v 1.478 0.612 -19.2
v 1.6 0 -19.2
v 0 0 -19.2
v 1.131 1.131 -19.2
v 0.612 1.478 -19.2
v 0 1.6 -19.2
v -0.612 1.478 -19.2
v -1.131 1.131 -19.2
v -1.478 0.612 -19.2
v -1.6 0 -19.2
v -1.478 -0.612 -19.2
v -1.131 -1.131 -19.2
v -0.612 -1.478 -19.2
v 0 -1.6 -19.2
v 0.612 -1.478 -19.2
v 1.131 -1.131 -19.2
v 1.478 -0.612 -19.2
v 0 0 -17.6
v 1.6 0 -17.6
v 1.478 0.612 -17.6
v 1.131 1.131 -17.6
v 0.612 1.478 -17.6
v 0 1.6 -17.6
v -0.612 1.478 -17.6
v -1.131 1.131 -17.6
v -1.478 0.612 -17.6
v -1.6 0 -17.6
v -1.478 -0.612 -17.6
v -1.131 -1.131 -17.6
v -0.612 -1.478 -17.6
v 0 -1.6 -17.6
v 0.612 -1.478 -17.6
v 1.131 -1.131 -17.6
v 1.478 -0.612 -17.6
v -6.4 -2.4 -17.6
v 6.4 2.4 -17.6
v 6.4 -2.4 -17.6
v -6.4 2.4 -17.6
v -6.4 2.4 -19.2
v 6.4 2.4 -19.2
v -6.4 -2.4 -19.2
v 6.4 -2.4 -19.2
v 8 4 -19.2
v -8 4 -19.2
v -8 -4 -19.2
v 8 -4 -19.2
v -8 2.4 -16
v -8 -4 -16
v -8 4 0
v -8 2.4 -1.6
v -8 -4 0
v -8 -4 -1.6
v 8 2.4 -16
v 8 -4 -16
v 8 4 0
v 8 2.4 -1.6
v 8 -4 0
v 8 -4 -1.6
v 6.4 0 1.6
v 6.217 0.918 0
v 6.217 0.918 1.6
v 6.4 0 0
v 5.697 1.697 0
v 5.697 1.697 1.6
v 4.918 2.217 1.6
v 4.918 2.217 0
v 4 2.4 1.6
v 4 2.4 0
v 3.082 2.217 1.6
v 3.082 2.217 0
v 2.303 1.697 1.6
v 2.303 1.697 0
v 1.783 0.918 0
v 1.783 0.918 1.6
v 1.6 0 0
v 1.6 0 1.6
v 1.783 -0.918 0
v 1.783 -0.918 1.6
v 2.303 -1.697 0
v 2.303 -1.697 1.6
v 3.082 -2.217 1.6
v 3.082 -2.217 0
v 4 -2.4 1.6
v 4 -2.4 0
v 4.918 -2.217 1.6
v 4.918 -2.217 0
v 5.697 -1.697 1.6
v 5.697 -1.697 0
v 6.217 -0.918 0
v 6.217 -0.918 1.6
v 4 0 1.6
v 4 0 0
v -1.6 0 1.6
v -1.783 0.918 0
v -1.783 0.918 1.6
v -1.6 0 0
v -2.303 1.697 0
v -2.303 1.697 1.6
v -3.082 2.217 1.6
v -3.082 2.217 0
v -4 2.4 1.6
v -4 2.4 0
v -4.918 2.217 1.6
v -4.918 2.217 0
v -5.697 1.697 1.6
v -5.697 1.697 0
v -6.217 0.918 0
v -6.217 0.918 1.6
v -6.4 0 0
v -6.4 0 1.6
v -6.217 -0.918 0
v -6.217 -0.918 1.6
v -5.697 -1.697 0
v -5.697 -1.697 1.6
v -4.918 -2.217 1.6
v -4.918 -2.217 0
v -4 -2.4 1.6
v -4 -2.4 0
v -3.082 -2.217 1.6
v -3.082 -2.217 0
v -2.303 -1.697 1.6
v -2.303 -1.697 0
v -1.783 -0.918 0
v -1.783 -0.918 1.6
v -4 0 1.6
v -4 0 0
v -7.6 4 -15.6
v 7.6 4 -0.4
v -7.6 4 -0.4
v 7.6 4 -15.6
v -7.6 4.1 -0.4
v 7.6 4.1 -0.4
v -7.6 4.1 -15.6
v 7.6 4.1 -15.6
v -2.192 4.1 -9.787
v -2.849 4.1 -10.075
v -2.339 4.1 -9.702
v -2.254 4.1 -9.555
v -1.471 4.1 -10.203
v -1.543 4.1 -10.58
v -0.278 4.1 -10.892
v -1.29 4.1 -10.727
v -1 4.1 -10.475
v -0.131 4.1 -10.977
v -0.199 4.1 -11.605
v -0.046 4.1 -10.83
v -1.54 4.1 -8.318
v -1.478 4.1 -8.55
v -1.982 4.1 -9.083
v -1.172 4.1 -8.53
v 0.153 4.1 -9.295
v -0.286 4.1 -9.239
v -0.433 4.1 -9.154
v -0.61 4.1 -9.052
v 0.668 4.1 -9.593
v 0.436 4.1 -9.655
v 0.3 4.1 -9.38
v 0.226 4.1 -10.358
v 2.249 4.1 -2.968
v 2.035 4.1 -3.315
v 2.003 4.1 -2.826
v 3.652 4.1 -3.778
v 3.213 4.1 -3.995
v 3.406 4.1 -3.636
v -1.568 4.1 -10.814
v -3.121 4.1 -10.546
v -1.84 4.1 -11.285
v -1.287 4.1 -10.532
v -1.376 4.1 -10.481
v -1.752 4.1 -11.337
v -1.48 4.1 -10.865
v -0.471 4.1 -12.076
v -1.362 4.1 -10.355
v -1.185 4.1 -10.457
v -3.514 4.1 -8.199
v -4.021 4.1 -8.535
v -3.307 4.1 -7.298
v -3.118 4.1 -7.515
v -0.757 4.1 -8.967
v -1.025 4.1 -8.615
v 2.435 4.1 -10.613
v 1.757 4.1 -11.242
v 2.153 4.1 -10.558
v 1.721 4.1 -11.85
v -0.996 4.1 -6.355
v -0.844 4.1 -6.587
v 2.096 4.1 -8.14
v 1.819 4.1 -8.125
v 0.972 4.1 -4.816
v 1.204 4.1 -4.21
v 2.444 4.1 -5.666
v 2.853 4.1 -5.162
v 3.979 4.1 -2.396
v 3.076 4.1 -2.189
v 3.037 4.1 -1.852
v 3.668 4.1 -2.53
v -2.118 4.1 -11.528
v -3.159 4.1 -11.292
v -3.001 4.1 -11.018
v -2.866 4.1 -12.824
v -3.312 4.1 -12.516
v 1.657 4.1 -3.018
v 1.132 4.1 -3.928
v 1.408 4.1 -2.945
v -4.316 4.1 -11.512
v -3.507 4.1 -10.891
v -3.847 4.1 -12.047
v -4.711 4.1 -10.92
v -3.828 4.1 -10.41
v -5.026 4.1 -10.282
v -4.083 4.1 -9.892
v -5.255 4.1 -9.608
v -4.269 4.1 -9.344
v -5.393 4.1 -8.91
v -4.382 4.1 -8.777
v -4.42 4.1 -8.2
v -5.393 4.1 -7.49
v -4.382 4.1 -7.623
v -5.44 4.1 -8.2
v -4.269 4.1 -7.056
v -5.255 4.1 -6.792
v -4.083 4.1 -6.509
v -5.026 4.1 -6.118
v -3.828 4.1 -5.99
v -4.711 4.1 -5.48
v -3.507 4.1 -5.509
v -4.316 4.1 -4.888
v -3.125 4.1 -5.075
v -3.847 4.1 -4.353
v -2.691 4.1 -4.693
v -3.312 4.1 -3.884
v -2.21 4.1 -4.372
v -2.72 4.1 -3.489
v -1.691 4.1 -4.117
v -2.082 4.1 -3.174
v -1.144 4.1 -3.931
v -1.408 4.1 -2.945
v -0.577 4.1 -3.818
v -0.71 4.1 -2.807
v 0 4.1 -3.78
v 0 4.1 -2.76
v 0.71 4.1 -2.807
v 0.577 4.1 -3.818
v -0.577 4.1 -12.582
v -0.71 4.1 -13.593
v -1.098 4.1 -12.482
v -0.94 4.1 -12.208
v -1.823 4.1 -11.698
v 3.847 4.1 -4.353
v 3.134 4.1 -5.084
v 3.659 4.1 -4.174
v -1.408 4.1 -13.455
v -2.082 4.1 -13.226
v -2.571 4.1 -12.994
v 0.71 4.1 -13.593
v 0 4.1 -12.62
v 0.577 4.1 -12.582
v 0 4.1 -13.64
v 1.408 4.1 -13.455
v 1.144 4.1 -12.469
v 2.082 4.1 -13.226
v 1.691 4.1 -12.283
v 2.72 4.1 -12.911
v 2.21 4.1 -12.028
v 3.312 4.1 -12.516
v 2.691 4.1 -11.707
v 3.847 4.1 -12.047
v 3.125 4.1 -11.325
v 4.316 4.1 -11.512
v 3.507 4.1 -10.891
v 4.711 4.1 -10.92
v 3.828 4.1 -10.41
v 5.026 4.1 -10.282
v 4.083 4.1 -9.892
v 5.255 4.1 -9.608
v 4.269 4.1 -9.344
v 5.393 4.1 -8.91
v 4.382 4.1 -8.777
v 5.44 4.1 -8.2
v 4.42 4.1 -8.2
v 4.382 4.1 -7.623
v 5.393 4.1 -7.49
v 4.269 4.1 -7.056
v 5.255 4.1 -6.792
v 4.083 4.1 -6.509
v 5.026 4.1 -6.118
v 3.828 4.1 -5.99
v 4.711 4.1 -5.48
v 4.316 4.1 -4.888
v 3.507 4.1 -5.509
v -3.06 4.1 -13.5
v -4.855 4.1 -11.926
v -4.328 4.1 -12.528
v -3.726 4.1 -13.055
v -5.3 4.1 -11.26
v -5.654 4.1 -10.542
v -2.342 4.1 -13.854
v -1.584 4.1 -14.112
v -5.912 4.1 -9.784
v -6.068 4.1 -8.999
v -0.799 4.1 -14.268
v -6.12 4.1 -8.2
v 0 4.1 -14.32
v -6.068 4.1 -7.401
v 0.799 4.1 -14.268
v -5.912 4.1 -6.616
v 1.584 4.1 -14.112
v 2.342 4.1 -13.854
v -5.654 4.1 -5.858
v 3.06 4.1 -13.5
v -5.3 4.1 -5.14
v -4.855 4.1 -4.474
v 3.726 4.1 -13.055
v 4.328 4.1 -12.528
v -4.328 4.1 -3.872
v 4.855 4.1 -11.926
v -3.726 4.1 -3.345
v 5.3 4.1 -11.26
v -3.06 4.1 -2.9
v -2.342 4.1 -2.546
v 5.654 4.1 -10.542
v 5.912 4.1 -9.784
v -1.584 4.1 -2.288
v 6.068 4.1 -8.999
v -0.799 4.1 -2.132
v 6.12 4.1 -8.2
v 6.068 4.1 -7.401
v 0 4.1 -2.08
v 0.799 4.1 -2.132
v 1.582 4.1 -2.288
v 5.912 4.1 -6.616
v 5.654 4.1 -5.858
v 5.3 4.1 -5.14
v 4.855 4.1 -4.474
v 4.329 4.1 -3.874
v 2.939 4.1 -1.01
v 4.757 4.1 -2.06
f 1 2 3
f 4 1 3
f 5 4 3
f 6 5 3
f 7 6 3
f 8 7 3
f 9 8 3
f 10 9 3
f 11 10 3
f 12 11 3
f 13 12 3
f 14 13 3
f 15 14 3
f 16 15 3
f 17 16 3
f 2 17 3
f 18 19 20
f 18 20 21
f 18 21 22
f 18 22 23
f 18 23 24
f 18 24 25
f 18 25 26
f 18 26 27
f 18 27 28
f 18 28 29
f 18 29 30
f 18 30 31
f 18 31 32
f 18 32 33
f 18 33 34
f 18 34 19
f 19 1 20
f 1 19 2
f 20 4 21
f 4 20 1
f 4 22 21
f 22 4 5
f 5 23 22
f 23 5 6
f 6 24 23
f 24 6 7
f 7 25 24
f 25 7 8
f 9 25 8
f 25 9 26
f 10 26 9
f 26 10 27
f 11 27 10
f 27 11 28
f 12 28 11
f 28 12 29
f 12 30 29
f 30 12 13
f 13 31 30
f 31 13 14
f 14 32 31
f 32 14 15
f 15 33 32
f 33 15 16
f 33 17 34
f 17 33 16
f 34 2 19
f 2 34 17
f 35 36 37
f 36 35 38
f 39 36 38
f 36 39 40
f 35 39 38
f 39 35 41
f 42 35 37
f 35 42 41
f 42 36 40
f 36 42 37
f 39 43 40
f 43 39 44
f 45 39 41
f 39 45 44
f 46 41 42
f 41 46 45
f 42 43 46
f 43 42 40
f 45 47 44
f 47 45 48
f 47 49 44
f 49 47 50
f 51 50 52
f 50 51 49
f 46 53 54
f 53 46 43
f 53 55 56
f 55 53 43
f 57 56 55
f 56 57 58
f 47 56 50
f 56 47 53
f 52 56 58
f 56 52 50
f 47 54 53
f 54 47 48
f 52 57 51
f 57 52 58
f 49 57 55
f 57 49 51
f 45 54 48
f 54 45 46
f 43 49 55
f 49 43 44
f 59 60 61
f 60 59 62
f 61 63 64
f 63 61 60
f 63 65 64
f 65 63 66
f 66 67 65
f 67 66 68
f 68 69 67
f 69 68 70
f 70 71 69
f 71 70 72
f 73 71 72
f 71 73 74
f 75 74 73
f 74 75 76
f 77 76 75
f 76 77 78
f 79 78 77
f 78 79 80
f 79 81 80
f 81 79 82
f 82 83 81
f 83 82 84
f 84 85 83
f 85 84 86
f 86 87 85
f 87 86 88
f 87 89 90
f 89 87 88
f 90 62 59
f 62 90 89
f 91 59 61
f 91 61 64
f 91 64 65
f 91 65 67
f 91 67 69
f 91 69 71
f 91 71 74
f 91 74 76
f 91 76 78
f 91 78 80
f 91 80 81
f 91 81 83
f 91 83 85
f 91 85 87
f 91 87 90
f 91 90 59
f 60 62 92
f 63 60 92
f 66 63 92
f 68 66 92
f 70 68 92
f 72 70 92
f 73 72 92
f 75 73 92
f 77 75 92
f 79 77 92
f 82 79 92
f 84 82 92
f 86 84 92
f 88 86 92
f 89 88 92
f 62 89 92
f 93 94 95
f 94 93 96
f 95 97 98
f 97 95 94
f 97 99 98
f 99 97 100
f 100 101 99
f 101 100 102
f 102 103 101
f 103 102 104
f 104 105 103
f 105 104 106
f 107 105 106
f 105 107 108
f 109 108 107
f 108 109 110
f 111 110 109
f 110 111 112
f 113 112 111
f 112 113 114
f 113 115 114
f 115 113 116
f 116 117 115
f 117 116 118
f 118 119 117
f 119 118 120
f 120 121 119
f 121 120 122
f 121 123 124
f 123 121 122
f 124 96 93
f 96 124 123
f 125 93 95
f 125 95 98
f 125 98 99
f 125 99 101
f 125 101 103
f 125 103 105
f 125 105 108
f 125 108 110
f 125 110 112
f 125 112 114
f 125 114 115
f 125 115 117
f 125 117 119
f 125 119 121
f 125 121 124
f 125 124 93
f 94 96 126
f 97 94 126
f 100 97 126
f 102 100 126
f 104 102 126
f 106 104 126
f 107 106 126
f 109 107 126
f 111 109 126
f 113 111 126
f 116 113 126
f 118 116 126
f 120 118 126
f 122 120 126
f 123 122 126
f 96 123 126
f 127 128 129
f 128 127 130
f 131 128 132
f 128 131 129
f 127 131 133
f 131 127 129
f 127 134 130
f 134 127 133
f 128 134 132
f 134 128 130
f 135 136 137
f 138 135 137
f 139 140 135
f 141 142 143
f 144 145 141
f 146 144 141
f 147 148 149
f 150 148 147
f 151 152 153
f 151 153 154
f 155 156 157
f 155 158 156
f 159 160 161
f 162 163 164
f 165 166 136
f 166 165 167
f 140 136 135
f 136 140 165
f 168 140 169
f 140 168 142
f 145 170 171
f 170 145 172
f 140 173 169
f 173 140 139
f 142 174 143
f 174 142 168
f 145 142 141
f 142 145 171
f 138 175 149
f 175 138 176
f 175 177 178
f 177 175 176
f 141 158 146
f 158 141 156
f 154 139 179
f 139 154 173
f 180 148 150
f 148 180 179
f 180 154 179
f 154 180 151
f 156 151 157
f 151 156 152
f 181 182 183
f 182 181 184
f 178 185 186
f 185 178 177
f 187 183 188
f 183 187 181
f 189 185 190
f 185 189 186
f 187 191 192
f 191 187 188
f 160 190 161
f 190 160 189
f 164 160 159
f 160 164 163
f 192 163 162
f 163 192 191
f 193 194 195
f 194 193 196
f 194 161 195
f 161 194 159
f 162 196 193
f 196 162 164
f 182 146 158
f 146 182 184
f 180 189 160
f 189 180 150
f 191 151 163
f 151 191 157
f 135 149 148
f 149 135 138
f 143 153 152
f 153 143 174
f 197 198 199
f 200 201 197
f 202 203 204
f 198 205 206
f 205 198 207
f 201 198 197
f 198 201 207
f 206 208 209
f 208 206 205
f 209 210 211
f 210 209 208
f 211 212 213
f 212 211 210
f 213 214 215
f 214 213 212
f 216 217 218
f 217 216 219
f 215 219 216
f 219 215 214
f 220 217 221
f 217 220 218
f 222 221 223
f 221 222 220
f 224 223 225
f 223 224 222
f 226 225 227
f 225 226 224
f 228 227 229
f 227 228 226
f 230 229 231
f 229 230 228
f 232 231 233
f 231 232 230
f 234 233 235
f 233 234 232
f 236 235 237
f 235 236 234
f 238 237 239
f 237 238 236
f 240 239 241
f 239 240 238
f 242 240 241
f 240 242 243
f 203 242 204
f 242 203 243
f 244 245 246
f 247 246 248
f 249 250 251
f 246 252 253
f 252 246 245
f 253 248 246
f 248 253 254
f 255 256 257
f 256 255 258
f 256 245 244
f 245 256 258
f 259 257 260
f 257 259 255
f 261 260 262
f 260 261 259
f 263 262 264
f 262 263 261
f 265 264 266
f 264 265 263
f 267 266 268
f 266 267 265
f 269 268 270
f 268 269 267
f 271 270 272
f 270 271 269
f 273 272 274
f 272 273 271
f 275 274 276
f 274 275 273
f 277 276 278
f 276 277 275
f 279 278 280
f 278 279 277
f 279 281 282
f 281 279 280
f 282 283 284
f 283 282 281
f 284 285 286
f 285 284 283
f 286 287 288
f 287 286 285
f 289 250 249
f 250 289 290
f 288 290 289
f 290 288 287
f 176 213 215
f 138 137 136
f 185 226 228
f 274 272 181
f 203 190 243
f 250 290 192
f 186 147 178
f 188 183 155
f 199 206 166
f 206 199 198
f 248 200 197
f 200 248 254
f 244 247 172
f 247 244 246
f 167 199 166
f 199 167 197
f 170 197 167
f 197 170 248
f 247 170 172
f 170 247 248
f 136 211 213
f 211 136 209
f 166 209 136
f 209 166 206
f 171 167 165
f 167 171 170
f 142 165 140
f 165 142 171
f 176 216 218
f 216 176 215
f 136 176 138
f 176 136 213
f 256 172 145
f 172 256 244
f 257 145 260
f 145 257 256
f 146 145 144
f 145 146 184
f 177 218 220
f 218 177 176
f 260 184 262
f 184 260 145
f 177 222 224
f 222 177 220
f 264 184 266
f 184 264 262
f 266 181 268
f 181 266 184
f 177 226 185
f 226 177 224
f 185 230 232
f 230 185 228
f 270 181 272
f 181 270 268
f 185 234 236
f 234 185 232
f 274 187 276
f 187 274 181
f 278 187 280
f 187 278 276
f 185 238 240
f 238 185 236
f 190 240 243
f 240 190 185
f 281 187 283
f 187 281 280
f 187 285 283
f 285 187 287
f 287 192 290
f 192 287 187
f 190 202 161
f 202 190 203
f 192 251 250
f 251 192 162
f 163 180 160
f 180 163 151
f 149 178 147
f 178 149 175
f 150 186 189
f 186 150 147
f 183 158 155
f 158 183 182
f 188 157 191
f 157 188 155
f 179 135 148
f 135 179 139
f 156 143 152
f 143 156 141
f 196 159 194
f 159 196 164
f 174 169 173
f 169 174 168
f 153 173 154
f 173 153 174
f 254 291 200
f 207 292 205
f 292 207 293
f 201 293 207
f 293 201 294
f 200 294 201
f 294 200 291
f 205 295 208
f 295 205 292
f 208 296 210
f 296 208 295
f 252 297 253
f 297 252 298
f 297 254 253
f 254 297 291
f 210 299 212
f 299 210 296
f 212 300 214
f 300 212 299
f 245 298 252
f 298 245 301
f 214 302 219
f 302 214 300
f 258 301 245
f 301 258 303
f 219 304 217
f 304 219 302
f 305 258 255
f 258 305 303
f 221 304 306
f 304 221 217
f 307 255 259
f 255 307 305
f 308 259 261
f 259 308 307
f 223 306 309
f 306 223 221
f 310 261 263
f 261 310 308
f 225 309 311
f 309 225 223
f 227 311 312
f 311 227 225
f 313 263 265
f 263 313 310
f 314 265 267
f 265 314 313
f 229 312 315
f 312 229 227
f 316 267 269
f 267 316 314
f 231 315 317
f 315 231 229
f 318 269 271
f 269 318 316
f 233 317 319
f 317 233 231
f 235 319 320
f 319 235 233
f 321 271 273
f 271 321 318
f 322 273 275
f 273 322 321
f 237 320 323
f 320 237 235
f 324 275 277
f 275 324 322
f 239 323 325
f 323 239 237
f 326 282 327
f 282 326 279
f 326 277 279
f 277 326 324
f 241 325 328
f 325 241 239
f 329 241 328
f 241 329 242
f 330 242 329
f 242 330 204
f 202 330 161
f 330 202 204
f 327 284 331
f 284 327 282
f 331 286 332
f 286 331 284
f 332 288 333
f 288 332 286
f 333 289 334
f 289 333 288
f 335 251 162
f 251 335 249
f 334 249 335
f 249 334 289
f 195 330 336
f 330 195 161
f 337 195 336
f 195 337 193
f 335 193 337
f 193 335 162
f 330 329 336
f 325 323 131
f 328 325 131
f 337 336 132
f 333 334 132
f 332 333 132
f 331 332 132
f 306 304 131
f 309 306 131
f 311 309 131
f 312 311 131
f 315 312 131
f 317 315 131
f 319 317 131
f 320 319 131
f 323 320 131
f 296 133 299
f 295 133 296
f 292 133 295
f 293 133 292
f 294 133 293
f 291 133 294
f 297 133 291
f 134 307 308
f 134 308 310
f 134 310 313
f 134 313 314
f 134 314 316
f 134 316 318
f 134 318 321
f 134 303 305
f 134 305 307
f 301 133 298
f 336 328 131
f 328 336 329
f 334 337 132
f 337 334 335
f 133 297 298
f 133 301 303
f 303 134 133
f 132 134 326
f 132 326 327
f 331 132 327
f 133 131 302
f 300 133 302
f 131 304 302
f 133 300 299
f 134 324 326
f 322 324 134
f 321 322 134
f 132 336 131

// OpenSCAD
use <../lib.scad>
use <169655f.scad>
use <4864a.scad>
function ldraw_lib__4864ad06() = [
// 0 Panel  1 x  2 x  2 with Launch Command Logo with White Border Facing Left Sticker
// 0 Name: 4864ad06.dat
// 0 Author: Chris Böhnke [KnightOfTarenta]
// 0 !LDRAW_ORG Shortcut UPDATE 2026-02
// 0 !LICENSE Licensed under CC BY 4.0 : see CAreadme.txt
// 
// 0 BFC CERTIFY CCW
  [0,"BFC","CERTIFY"],
  [0,"BFC","CCW"],
// 
// 0 !CATEGORY Sticker Shortcut
// 
// 0 !KEYWORDS Bricklink 4864apb006L, BrickOwl 388065, Launch Command, Set 6544
// 0 !KEYWORDS Shuttle Transcon 2, space port, stamp, town
// 
// 0 !PREVIEW 16 0 0 0 -1 0 0 0 1 0 0 0 -1
// 
// 0 !HISTORY 2026-03-06 [OrionP] Official Update 2026-02
// 
// 1 16 0 0 0 1 0 0 0 1 0 0 0 1 4864a.dat
  [1,16,0,0,0,1,0,0,0,1,0,0,0,1, ldraw_lib__4864a()],
// 1 16 0 20 10 -1 0 0 0 0 -1 0 -1 0 169655f.dat
  [1,16,0,20,10,-1,0,0,0,0,-1,0,-1,0, ldraw_lib__169655f()],
];
module ldraw_lib__4864ad06(step=0, col=false, unit=2/5, alt=false, line=0.2, solid=!$preview)
    makepoly(ldraw_lib__4864ad06(), step=step, col=col, unit=unit, alt=alt, line=line, solid=solid);
ldraw_lib__4864ad06(line=0.2);
